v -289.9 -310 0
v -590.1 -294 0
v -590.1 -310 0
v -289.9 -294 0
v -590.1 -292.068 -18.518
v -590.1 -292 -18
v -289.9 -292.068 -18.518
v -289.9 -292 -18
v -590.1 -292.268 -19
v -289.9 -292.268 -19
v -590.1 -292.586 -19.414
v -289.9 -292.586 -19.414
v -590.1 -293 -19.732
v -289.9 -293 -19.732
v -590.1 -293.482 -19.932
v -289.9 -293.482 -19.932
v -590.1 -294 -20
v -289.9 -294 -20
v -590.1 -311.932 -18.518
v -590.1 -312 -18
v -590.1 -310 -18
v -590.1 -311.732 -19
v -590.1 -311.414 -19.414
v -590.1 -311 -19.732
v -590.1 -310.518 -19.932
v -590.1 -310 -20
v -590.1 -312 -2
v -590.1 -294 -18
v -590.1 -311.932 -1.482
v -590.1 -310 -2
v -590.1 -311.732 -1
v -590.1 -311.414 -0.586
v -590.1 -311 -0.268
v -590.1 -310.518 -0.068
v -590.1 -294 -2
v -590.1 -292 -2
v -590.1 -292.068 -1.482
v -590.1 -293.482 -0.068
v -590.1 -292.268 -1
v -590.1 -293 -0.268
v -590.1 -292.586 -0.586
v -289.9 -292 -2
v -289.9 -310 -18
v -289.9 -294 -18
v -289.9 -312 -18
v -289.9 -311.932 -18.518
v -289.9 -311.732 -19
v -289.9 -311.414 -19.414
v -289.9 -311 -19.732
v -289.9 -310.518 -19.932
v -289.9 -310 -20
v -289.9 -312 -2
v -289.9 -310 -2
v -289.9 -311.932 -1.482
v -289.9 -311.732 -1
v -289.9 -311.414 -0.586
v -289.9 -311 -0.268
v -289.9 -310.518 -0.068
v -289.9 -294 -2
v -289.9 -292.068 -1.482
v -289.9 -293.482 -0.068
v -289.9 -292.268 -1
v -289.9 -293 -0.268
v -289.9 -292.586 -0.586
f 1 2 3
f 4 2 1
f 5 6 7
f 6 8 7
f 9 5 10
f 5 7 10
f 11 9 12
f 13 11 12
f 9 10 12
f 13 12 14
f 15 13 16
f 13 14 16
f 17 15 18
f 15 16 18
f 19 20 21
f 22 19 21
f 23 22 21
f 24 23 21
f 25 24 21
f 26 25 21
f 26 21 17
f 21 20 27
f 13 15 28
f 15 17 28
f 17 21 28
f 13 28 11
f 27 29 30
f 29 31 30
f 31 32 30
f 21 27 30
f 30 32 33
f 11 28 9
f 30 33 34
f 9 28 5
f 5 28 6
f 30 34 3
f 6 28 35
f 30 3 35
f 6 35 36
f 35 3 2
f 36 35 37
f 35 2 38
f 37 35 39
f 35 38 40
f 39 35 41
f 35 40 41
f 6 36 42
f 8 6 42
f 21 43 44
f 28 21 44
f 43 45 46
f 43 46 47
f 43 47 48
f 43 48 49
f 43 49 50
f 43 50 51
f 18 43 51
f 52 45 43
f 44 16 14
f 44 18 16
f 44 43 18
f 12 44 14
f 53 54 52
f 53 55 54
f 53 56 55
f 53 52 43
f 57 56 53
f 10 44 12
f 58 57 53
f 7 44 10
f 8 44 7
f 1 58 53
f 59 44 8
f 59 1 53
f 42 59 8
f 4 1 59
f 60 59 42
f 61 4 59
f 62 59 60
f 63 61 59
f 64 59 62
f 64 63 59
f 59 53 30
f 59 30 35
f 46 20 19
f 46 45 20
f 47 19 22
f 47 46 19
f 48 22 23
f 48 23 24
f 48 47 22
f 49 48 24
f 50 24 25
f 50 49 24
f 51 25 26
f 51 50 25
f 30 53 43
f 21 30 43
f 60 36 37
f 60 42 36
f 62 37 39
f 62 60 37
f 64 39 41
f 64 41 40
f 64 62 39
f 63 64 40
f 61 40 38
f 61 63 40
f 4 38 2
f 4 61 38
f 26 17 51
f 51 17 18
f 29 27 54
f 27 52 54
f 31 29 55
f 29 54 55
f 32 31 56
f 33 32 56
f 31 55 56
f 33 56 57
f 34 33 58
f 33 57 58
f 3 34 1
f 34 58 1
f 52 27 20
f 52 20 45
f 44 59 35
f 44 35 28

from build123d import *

# Parameters (mm, degrees)
SKETCH1_W           = 300.2
SKETCH1_H           = 20
BOSS_EXTRUDE1_DEPTH = 20
FILLET1_R           = 2
SKETCH2_W           = 16
SKETCH2_H           = 16
CUT_EXTRUDE1_DEPTH  = 301.2


with BuildPart() as part:
    # Sketch1 → Boss-Extrude1 (new body)
    with BuildSketch(Plane.XY):
        with Locations((-440, -302)):
            Rectangle(SKETCH1_W, SKETCH1_H)
    extrude(amount=-BOSS_EXTRUDE1_DEPTH)

    # Fillet1
    fillet1_edges = [part.edges().sort_by_distance(p)[0] for p in [
        (-440, -312, -20),
        (-440, -312, 0),
        (-440, -292, 0),
        (-440, -292, -20),
    ]]
    fillet(fillet1_edges, radius=FILLET1_R)

    # Sketch2 → Cut-Extrude1 (cut, through all)
    with BuildSketch(Plane(origin=(-289.9, 0, 0), x_dir=(0, 0, -1), z_dir=(1, 0, 0))):
        with Locations((10, -302)):
            Rectangle(SKETCH2_W, SKETCH2_H)
    extrude(amount=-CUT_EXTRUDE1_DEPTH, mode=Mode.SUBTRACT)


solid = part.part
